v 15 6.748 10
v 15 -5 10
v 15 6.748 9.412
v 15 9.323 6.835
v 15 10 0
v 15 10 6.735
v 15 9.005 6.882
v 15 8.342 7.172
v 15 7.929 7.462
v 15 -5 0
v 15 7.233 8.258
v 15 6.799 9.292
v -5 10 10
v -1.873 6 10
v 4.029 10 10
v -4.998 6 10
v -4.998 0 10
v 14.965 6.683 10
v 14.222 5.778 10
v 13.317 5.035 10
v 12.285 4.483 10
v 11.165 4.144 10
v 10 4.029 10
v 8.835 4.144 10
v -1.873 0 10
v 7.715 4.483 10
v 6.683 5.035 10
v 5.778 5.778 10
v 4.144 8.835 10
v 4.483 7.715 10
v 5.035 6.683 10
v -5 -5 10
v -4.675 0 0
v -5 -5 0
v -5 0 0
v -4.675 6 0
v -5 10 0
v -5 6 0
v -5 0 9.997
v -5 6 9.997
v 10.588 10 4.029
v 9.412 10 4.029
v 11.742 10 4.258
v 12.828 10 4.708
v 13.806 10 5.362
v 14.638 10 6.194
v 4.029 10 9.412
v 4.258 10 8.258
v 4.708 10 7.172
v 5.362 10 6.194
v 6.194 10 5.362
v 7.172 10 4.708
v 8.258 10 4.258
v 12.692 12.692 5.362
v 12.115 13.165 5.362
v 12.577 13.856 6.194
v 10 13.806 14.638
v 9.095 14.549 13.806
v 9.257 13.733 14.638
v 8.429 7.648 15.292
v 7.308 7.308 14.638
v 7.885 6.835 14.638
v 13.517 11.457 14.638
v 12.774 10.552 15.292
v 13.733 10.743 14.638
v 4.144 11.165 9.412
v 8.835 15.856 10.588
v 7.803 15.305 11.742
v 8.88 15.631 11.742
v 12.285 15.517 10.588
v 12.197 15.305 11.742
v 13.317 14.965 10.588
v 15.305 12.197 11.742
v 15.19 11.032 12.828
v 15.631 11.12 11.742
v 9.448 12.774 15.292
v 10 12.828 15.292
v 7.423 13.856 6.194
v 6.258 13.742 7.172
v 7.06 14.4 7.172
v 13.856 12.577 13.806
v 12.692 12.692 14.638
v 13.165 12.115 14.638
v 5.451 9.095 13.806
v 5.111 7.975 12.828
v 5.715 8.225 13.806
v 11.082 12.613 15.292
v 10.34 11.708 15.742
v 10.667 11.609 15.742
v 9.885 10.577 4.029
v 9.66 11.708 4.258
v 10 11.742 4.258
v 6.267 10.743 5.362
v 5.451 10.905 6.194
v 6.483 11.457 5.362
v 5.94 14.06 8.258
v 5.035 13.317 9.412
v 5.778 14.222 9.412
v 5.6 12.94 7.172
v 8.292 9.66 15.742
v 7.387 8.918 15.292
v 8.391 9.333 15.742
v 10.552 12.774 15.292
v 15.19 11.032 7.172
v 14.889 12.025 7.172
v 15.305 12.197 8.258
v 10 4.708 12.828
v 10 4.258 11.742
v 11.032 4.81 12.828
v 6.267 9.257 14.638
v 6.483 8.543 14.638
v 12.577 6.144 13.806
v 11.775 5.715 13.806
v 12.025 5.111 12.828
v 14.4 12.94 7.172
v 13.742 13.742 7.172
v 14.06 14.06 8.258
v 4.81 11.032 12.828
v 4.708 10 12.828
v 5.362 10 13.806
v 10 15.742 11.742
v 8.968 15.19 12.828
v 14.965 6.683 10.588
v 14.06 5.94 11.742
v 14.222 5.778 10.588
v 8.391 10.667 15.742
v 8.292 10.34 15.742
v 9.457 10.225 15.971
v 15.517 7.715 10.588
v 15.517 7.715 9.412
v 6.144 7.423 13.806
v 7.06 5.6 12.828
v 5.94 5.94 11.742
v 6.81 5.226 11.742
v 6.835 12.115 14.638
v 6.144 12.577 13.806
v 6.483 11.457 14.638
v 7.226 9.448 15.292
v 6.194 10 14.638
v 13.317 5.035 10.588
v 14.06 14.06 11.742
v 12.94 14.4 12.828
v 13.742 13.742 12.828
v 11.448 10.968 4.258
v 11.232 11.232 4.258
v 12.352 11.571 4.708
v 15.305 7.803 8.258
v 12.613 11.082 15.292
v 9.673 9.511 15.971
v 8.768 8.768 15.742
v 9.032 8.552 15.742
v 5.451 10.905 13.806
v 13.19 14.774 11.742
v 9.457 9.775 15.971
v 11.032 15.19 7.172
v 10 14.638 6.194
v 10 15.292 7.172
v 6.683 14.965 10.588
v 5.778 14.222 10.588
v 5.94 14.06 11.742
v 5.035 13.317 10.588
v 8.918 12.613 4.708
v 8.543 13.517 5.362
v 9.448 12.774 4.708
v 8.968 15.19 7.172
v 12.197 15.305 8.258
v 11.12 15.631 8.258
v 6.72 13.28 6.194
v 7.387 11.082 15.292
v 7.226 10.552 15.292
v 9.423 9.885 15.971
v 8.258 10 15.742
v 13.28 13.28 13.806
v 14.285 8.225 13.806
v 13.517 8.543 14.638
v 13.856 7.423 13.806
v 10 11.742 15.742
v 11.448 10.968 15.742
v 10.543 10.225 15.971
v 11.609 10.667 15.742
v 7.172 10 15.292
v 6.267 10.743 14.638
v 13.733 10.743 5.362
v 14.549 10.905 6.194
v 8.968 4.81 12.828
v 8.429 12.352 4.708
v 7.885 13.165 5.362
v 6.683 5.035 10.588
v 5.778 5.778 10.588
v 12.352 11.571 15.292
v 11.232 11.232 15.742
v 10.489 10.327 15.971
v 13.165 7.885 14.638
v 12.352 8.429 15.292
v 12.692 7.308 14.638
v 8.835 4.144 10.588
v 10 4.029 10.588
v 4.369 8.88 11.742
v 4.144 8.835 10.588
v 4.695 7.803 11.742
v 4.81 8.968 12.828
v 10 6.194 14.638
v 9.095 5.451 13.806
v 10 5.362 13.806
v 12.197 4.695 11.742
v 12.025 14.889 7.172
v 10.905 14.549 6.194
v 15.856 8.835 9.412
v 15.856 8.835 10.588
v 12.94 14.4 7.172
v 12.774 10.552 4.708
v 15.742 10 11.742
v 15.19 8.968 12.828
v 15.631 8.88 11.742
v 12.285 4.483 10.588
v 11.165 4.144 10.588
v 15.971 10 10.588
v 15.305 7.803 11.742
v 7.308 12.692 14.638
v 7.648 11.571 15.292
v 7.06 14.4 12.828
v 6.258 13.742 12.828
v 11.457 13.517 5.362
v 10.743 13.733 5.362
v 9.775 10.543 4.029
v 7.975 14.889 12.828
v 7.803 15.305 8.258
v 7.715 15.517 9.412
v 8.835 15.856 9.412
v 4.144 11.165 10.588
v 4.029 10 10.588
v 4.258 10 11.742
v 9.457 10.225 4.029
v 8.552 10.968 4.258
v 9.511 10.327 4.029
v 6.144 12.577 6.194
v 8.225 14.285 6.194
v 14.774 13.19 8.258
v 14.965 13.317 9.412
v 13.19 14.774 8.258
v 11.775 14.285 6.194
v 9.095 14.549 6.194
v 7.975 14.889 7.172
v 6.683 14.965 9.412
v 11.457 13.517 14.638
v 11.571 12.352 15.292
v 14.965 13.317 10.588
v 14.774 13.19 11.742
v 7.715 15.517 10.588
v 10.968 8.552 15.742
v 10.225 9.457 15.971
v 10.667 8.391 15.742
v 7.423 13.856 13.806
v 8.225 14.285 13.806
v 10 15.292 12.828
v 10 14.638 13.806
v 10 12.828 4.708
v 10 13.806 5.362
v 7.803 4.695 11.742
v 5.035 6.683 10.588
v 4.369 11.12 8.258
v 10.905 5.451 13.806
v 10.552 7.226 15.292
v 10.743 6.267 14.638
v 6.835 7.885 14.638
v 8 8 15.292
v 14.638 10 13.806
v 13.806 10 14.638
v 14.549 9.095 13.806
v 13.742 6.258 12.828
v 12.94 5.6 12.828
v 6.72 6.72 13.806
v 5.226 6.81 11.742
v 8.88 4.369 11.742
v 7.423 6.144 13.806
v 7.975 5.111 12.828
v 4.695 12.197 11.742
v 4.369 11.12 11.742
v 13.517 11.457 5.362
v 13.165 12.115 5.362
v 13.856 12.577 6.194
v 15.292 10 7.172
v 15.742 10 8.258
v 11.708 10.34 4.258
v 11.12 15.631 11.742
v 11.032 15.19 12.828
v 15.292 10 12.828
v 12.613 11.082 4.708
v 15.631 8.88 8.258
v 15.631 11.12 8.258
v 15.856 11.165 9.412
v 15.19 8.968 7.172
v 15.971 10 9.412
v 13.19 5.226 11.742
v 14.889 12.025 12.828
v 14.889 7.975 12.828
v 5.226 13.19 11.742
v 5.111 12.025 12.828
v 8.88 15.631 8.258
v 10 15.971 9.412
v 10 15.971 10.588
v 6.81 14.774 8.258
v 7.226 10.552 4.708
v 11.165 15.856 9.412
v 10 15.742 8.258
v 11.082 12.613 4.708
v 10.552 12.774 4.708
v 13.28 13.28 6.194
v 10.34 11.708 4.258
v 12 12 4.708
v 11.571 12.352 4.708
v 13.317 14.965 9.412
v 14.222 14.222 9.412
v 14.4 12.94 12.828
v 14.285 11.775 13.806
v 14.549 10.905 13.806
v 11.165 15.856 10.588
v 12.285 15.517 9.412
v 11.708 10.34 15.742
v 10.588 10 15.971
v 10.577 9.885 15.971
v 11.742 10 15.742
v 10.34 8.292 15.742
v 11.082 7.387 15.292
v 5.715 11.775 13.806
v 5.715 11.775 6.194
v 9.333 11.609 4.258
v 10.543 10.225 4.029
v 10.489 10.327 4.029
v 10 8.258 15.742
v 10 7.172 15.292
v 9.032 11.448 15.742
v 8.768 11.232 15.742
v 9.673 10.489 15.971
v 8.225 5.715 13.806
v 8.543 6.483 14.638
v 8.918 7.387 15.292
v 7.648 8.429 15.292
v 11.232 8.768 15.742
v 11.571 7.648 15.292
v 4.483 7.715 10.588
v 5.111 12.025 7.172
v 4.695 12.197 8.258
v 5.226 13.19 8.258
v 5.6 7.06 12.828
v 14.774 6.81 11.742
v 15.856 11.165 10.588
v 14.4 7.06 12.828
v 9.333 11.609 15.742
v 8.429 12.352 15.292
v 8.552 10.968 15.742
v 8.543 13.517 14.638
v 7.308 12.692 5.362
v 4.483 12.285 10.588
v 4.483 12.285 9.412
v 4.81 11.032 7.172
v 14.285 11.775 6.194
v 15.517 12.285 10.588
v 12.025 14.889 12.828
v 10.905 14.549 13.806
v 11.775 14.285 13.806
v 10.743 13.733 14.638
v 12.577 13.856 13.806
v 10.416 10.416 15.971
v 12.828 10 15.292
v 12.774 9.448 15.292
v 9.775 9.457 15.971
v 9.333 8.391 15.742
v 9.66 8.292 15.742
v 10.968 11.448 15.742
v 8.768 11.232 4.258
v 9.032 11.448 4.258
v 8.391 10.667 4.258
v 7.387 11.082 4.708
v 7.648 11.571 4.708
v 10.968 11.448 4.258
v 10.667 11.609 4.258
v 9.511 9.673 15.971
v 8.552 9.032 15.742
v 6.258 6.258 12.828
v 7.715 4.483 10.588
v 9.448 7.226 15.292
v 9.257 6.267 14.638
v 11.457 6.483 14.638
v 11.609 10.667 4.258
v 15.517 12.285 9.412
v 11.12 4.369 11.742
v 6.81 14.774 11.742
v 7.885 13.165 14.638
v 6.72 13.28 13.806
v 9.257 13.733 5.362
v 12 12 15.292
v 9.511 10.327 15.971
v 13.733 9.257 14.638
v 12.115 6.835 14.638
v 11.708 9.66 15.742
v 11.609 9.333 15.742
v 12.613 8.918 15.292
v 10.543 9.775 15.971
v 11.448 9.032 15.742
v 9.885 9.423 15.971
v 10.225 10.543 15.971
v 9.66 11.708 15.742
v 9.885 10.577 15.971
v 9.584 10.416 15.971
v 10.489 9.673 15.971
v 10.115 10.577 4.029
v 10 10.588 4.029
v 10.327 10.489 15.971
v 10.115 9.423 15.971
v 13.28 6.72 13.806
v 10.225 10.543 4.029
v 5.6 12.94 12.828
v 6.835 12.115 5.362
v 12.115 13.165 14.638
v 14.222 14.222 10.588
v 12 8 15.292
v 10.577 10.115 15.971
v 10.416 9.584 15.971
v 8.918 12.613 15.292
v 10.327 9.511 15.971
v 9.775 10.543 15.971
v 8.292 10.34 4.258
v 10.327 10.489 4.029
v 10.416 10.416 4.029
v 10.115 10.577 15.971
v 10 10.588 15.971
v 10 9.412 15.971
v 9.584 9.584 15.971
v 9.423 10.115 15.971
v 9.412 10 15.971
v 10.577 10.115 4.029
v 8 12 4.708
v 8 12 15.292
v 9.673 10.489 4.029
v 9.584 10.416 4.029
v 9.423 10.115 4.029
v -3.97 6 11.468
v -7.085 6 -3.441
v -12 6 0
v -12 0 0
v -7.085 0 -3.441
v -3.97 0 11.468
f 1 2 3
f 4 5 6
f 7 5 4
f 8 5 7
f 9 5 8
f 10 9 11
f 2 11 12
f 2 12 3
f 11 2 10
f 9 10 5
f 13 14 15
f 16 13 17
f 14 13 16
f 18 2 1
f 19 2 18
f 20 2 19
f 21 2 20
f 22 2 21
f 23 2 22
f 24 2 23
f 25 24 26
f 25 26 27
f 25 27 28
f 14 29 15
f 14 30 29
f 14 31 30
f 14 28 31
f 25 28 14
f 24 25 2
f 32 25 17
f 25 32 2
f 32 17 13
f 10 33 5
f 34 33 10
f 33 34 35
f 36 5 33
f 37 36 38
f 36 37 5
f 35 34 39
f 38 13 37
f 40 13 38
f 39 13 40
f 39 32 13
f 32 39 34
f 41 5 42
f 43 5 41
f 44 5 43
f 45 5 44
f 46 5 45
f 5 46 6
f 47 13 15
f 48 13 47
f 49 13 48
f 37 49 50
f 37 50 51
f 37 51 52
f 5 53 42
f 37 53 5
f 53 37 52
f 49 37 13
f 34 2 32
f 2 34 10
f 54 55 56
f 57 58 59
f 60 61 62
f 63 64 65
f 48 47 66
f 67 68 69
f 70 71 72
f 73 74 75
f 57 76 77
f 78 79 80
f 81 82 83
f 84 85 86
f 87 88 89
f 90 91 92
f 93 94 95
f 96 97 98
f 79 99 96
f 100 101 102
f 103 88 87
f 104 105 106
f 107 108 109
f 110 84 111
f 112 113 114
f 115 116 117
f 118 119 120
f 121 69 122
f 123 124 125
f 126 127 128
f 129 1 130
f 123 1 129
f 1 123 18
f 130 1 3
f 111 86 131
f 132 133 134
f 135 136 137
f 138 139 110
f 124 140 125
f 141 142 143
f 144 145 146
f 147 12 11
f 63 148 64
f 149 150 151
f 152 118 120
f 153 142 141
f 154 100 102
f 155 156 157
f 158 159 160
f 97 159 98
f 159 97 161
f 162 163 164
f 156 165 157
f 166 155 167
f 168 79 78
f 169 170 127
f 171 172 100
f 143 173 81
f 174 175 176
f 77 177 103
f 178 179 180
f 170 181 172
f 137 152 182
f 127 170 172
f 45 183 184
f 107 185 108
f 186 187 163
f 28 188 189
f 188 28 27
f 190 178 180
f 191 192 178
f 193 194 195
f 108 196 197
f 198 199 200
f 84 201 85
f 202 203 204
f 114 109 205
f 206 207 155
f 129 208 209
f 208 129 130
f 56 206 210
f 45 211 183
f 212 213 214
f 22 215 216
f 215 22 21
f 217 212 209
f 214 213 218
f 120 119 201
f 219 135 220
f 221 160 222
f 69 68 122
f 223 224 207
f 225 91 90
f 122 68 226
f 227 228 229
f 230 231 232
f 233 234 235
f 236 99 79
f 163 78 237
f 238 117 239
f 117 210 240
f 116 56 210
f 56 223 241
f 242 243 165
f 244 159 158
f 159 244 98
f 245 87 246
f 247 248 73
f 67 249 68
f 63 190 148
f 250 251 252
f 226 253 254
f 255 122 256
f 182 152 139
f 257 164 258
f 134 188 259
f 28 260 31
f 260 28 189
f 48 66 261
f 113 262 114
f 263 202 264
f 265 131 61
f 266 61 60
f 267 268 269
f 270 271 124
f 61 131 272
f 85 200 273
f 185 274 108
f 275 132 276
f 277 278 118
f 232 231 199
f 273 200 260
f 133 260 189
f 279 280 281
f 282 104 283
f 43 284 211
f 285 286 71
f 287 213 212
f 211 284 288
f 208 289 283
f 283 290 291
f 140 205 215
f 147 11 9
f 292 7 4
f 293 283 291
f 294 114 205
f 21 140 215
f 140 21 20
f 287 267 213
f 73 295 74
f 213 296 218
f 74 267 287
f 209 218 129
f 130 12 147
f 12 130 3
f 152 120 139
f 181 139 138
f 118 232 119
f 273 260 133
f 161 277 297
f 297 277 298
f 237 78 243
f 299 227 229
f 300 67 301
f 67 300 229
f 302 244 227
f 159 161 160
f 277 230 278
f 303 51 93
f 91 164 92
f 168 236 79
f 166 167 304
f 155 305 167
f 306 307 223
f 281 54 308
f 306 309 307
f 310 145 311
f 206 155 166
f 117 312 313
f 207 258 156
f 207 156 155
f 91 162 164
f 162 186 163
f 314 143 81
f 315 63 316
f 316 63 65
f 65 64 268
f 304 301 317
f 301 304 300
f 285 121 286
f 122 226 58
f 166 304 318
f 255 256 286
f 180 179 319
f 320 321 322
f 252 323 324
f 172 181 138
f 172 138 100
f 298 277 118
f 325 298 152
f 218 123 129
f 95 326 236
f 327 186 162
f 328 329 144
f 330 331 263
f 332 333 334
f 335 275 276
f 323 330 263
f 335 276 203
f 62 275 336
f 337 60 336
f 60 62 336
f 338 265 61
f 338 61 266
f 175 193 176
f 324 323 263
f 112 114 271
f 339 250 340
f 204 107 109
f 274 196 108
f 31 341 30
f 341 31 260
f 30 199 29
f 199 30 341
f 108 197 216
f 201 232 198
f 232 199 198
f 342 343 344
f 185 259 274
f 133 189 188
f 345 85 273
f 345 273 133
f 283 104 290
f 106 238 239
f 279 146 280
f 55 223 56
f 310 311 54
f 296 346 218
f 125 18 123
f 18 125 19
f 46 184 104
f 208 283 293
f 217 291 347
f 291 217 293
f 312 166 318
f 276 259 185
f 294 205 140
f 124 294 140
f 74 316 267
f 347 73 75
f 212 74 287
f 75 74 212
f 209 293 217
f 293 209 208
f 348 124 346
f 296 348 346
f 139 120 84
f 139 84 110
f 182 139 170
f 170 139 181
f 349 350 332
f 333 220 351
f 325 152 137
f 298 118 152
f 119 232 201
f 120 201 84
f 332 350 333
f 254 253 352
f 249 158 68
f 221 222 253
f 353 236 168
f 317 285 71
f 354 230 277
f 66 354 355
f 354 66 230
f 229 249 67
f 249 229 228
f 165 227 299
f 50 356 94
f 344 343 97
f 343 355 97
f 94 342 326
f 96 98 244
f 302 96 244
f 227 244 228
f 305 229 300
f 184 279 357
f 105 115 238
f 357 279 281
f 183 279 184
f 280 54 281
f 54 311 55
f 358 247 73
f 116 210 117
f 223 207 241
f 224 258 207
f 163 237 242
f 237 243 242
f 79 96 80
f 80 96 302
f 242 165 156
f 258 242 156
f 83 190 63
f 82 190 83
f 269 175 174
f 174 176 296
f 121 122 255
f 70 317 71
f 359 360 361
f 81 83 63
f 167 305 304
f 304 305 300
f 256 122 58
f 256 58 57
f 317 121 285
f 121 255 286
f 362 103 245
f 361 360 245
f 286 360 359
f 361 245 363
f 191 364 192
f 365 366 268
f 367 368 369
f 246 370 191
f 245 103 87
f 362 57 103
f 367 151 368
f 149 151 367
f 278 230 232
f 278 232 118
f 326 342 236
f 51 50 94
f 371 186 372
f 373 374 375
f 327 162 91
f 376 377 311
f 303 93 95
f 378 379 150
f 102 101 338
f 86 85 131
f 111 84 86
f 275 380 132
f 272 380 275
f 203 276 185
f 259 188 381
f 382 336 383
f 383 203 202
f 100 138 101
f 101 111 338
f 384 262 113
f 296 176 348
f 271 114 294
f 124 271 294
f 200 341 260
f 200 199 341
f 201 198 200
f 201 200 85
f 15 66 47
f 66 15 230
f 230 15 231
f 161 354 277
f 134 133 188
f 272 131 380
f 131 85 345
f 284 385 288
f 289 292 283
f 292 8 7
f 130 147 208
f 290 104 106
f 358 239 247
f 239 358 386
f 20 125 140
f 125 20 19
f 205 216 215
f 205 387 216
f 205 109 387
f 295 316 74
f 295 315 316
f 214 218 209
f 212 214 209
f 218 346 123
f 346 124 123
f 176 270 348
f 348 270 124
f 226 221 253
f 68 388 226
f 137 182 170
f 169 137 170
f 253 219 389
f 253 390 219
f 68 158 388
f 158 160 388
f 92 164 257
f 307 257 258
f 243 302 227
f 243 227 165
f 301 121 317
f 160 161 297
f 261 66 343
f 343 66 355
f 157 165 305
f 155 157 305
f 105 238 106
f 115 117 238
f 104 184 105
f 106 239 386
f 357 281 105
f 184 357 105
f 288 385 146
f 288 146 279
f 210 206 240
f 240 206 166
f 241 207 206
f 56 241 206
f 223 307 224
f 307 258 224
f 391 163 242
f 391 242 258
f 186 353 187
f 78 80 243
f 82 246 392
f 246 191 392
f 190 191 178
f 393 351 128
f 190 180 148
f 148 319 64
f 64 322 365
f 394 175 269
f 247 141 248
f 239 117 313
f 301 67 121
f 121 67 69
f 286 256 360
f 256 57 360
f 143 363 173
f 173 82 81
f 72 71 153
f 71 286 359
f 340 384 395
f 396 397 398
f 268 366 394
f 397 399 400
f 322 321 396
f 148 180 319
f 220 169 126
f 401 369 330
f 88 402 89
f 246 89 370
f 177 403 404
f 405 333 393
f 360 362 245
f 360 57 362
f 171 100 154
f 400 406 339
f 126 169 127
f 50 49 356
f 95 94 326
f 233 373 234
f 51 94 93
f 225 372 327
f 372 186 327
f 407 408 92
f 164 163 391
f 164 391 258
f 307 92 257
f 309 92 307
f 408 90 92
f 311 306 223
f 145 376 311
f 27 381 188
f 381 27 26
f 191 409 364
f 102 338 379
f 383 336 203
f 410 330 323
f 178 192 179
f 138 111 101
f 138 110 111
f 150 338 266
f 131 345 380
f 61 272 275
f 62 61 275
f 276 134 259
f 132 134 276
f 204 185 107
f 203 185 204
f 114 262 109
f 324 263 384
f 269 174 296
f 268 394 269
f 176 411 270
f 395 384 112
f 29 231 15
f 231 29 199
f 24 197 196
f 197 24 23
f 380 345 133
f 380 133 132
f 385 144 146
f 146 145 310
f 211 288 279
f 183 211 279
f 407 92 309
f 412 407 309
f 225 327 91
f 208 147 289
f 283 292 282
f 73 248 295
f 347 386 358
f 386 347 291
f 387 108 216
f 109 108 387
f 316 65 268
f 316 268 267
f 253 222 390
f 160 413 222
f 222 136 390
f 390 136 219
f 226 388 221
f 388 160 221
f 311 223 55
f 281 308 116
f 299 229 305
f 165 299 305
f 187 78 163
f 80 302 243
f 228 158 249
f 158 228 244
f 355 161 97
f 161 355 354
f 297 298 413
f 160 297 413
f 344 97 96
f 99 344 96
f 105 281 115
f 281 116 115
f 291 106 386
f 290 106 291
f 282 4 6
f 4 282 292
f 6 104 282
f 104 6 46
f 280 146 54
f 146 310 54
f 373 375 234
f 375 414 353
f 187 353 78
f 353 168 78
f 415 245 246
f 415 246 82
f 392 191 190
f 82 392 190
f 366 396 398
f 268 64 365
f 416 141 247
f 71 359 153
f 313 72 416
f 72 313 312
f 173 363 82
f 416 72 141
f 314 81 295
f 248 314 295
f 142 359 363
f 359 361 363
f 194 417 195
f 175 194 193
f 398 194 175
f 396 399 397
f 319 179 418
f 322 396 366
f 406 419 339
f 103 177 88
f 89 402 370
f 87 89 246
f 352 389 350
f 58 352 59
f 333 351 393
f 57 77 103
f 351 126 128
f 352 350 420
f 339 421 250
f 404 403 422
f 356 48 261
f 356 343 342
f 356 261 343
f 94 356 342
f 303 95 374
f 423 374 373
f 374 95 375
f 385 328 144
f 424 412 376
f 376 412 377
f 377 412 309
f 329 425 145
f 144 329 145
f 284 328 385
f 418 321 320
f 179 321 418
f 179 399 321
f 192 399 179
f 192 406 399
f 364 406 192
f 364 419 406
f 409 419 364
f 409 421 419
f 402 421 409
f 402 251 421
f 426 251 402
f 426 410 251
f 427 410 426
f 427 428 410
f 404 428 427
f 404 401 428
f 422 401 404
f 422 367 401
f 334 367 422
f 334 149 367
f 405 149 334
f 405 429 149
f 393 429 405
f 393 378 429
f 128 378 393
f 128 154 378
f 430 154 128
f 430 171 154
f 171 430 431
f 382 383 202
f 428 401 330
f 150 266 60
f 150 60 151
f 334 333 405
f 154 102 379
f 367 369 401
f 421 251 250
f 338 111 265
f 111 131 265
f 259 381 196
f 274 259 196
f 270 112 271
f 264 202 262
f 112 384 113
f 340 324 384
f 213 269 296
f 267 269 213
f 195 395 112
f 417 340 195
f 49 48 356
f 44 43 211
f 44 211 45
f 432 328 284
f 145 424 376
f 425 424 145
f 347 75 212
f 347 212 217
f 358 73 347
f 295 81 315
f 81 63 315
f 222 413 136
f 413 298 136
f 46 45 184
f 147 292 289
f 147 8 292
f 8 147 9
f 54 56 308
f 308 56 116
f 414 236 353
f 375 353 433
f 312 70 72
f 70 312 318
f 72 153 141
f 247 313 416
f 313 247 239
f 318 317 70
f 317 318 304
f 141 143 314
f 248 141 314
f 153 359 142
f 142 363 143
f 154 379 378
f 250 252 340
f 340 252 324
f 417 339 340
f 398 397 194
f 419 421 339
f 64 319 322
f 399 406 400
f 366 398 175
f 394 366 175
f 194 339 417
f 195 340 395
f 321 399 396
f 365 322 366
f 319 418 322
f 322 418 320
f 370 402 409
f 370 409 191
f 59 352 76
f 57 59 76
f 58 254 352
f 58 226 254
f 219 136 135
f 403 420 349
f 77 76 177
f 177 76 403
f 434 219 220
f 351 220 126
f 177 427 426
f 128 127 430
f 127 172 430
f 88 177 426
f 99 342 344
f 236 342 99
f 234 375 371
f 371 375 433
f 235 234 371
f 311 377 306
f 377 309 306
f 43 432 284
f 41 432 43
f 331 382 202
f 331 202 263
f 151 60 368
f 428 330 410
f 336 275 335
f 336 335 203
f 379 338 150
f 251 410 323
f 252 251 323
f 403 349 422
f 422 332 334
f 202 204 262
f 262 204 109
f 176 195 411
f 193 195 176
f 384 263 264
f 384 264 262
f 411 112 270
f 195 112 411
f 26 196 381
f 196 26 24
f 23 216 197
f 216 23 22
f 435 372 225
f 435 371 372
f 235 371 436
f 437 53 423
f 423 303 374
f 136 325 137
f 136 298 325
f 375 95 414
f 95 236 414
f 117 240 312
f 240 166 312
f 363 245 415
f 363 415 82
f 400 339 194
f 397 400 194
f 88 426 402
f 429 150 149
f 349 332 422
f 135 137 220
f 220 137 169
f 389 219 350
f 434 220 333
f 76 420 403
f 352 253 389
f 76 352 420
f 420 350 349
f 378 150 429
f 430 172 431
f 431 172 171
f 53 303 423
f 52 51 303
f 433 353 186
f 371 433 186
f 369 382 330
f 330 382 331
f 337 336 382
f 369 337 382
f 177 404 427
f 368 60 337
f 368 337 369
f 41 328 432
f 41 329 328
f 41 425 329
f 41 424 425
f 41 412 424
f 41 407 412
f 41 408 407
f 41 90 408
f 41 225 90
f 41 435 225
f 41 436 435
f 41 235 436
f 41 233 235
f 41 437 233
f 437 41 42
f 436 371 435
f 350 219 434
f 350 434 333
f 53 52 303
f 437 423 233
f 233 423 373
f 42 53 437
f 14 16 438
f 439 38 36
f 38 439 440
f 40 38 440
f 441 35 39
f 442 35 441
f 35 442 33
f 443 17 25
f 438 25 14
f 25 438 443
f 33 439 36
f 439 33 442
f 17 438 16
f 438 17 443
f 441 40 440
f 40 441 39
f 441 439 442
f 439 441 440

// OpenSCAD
// Exercise the agent lighting modes (normal / coordinate / flat / chromatic).
//
// Deliberately mixed: flat faces give each mode a constant-valued region that is
// easy to reason about, the sphere gives smoothly varying normals, and the
// off-origin placement means a coordinate map that failed to normalize against
// the bounding box would saturate rather than quietly look plausible.
translate([-5, -5, 0]) cube([20, 15, 10]);
translate([10, 10, 10]) sphere(r = 6, $fn = 32);
translate([-12, 0, 0]) rotate([0, 35, 0]) cube([6, 6, 14]);
